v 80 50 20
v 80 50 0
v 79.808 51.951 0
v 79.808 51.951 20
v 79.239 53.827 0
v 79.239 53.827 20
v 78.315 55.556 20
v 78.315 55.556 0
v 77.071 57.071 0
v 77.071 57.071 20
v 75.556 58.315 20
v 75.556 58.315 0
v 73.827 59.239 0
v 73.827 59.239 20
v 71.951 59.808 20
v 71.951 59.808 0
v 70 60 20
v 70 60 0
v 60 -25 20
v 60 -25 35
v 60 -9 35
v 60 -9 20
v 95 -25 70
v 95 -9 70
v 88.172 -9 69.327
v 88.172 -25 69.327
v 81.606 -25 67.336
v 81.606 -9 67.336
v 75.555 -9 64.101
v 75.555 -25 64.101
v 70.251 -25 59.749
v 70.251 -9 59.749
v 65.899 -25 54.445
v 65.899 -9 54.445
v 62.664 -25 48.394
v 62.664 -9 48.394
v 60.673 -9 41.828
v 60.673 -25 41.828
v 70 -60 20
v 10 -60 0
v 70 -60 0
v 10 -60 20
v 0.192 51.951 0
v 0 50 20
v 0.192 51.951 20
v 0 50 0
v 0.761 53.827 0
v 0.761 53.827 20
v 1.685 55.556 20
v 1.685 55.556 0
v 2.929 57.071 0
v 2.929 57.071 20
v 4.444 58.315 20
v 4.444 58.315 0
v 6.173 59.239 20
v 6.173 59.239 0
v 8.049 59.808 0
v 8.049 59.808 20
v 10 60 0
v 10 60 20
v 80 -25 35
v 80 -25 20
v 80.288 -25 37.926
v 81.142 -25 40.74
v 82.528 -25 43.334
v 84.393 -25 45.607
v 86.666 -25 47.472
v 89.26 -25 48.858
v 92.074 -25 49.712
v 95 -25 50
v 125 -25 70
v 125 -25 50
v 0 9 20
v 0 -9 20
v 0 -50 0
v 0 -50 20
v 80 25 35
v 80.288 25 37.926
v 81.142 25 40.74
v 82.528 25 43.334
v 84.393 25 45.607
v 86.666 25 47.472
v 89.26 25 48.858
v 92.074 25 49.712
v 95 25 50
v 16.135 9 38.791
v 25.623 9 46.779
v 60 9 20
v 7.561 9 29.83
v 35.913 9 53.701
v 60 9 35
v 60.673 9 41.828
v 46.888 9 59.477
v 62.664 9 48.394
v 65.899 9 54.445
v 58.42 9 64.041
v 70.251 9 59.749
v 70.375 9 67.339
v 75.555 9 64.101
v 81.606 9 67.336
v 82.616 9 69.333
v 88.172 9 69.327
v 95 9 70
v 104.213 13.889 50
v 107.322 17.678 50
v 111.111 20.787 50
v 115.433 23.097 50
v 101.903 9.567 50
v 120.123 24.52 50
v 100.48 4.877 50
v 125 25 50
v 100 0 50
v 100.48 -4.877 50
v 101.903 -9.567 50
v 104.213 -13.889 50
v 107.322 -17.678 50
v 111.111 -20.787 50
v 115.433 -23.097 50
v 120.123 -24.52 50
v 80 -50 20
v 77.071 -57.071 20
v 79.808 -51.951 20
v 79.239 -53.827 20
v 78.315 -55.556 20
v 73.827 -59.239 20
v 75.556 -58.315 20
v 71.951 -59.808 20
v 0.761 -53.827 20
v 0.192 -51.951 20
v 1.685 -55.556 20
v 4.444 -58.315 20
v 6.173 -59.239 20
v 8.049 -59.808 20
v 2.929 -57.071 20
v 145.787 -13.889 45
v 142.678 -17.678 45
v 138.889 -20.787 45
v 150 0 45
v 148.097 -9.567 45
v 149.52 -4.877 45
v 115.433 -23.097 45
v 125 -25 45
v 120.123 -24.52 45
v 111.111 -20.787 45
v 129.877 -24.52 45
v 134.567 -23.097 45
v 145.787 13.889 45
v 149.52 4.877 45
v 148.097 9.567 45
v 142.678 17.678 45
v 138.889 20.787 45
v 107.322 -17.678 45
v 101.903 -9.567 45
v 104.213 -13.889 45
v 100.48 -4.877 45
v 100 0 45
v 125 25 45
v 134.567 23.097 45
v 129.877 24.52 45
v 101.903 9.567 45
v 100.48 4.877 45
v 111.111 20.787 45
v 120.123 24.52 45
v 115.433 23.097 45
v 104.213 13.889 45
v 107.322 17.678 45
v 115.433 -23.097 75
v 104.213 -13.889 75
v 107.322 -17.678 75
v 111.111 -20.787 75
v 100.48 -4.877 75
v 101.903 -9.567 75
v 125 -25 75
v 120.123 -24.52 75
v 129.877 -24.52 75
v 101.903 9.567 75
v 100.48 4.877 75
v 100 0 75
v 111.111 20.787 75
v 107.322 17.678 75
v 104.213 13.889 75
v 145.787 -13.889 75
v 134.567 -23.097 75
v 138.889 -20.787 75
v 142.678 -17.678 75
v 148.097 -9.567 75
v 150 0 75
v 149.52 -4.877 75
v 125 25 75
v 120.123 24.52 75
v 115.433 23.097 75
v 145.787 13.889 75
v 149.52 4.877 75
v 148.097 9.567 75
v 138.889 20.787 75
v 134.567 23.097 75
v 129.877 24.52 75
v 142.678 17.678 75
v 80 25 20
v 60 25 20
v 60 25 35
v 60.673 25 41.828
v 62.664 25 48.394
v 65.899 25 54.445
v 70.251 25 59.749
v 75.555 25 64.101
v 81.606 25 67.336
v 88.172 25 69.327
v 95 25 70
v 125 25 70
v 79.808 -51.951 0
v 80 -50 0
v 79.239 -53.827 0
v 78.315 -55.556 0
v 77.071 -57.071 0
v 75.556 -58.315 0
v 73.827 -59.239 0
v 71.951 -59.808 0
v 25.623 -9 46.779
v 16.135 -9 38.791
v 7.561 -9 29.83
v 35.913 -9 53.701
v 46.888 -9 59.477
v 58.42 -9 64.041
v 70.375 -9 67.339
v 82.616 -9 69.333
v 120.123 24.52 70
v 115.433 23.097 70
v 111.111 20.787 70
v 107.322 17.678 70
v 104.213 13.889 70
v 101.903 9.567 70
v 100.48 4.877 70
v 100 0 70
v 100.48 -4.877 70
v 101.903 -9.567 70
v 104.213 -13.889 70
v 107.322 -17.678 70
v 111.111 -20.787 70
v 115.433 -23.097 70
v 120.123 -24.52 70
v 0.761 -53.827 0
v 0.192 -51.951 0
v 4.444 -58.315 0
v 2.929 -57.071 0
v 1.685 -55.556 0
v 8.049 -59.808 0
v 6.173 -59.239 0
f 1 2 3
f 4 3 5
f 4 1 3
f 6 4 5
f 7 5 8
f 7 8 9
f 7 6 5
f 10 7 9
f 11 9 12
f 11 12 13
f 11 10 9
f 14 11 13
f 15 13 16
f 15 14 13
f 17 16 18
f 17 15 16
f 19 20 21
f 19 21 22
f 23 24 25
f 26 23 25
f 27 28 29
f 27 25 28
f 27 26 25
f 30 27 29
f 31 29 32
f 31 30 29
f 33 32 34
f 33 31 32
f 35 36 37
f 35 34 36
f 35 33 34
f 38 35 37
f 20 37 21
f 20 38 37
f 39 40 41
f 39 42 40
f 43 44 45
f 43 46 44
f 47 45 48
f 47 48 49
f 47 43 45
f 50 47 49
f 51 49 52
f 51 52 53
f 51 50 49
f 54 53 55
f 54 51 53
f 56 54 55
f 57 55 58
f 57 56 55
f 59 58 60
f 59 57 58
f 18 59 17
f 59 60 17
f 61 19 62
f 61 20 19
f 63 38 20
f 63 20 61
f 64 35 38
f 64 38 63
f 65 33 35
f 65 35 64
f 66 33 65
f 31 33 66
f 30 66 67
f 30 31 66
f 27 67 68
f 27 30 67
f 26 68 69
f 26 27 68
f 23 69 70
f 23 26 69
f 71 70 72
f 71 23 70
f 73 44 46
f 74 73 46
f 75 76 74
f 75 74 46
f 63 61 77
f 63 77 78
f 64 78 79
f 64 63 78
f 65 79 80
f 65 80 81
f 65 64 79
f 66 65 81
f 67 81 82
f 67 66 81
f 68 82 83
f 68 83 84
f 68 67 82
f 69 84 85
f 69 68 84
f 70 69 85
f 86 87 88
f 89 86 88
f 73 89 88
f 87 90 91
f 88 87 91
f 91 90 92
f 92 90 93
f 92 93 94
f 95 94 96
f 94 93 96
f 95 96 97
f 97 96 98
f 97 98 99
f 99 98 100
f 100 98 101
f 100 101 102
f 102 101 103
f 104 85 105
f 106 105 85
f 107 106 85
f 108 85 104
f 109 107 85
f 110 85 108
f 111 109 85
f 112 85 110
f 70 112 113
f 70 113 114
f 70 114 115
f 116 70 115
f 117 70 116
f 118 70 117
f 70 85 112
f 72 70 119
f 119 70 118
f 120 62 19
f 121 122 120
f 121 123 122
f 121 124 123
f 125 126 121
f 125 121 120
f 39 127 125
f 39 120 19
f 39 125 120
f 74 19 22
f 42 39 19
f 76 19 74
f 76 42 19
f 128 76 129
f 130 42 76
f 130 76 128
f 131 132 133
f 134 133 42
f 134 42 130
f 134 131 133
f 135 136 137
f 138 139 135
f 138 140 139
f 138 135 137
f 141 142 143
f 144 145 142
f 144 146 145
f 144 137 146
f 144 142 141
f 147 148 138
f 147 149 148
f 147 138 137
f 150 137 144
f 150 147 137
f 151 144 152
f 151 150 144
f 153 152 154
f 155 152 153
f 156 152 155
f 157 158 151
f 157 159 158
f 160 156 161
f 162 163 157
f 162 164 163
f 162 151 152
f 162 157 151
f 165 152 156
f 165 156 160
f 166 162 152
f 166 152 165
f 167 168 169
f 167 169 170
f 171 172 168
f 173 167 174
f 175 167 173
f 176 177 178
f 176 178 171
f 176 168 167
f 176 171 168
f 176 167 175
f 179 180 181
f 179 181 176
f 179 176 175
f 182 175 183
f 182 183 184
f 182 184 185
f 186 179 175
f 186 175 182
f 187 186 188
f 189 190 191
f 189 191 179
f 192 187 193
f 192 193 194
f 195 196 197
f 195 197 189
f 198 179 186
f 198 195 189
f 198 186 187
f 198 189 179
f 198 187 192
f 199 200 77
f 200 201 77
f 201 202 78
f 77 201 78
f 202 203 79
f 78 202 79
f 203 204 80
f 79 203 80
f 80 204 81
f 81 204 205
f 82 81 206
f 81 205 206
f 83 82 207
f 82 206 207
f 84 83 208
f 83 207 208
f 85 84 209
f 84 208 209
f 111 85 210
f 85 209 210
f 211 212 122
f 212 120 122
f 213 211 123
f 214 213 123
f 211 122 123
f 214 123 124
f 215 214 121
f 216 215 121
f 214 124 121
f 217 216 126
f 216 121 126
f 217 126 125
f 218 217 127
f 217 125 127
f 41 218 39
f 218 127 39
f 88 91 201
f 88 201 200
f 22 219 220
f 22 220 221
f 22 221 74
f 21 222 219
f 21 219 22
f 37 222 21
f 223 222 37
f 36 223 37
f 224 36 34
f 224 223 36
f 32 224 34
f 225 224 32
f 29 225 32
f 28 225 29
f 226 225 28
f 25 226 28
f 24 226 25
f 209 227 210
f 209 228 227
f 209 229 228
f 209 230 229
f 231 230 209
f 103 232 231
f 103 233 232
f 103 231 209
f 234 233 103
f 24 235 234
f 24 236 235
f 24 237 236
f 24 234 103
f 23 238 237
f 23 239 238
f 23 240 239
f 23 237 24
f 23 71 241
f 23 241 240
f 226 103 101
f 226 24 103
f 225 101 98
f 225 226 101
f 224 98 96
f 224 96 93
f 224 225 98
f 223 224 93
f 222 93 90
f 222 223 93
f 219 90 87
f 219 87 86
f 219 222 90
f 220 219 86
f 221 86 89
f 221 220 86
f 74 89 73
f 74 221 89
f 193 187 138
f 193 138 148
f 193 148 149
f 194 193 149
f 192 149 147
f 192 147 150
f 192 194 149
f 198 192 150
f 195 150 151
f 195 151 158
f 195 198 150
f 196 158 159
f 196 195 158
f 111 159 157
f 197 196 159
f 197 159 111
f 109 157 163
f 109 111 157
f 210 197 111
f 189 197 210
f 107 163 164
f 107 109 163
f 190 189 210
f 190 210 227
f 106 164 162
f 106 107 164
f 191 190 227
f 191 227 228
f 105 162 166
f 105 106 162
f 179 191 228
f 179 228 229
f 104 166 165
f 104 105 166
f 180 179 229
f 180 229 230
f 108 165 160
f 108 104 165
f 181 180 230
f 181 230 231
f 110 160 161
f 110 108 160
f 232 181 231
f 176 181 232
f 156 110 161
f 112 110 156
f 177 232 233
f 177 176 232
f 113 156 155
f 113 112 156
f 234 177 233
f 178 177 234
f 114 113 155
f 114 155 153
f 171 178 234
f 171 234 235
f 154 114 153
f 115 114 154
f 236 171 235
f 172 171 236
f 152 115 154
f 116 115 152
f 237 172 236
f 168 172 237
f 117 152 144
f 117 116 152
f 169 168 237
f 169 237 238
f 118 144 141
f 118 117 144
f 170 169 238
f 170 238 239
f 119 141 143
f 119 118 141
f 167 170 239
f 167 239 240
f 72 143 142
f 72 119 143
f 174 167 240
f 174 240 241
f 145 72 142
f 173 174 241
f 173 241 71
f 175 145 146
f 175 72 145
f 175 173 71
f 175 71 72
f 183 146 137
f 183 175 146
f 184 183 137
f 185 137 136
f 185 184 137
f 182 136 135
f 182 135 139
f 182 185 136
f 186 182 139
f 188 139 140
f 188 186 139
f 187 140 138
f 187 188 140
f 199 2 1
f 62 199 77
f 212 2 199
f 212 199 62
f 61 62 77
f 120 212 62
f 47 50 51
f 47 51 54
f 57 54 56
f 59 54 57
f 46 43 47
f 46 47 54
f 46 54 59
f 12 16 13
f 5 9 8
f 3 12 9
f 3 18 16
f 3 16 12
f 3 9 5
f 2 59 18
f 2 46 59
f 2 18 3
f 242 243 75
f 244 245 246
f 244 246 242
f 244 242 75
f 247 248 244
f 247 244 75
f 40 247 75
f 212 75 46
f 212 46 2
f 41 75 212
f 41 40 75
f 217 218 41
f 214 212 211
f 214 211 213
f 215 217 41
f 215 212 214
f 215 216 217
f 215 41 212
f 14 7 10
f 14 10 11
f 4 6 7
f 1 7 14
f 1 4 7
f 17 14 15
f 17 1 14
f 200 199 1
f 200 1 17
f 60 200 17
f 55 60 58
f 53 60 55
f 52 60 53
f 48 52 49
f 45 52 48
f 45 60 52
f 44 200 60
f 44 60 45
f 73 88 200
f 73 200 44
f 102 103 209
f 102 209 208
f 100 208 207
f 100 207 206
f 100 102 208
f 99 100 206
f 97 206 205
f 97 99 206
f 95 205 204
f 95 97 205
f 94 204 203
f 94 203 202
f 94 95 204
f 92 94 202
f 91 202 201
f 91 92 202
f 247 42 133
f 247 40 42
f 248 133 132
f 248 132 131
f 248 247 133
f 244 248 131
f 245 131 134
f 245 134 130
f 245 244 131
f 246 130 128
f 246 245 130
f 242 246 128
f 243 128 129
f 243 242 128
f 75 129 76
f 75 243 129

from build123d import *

# Parameters (mm, degrees)
F1_DEPTH = 60
F2_DEPTH = 9
F3_DEPTH = 25
F5_R     = 10


with BuildPart() as f1:
    # F0 (on Front) → F1 (new body, symmetric)
    with BuildSketch(Plane.XZ):
        Polygon((0, 20), (0, 0), (80, 0), (80, 20), (60, 20), align=None)
    extrude(amount=F1_DEPTH, both=True)

    # F0 (on Front) → F2 (join, symmetric)
    with BuildSketch(Plane.XZ):
        with BuildLine():
            ThreePointArc((95, 70), (41.322724, 56.736825), (0, 20))
            Line((0, 20), (60, 20))
            Line((60, 20), (60, 35))
            ThreePointArc((60, 35), (70.251263, 59.748737), (95, 70))
        make_face()
    extrude(amount=F2_DEPTH, both=True)

    # F0 (on Front) → F3 (join, symmetric)
    with BuildSketch(Plane.XZ):
        with BuildLine():
            Line((60, 20), (80, 20))
            Line((80, 20), (80, 35))
            ThreePointArc((80, 35), (84.393398, 45.606602), (95, 50))
            Line((95, 50), (125, 50))
            Line((125, 50), (125, 70))
            Line((125, 70), (95, 70))
            ThreePointArc((95, 70), (70.251263, 59.748737), (60, 35))
            Line((60, 35), (60, 20))
        make_face()
    extrude(amount=F3_DEPTH, both=True)

    # F0 (on Front) → F4 (revolve)
    with BuildSketch(Plane.XZ):
        Polygon((125, 75), (125, 70), (125, 50), (125, 45), (150, 45), (150, 75), align=None)
    revolve(axis=Axis((125, 0, 60), (0, 0, 1)))

    # F5
    f5_edges = [f1.edges().sort_by_distance(p)[0] for p in [
        (0, -60, 10),
        (80, -60, 10),
        (0, 60, 10),
        (80, 60, 10),
    ]]
    fillet(f5_edges, radius=F5_R)


solid = f1.part
